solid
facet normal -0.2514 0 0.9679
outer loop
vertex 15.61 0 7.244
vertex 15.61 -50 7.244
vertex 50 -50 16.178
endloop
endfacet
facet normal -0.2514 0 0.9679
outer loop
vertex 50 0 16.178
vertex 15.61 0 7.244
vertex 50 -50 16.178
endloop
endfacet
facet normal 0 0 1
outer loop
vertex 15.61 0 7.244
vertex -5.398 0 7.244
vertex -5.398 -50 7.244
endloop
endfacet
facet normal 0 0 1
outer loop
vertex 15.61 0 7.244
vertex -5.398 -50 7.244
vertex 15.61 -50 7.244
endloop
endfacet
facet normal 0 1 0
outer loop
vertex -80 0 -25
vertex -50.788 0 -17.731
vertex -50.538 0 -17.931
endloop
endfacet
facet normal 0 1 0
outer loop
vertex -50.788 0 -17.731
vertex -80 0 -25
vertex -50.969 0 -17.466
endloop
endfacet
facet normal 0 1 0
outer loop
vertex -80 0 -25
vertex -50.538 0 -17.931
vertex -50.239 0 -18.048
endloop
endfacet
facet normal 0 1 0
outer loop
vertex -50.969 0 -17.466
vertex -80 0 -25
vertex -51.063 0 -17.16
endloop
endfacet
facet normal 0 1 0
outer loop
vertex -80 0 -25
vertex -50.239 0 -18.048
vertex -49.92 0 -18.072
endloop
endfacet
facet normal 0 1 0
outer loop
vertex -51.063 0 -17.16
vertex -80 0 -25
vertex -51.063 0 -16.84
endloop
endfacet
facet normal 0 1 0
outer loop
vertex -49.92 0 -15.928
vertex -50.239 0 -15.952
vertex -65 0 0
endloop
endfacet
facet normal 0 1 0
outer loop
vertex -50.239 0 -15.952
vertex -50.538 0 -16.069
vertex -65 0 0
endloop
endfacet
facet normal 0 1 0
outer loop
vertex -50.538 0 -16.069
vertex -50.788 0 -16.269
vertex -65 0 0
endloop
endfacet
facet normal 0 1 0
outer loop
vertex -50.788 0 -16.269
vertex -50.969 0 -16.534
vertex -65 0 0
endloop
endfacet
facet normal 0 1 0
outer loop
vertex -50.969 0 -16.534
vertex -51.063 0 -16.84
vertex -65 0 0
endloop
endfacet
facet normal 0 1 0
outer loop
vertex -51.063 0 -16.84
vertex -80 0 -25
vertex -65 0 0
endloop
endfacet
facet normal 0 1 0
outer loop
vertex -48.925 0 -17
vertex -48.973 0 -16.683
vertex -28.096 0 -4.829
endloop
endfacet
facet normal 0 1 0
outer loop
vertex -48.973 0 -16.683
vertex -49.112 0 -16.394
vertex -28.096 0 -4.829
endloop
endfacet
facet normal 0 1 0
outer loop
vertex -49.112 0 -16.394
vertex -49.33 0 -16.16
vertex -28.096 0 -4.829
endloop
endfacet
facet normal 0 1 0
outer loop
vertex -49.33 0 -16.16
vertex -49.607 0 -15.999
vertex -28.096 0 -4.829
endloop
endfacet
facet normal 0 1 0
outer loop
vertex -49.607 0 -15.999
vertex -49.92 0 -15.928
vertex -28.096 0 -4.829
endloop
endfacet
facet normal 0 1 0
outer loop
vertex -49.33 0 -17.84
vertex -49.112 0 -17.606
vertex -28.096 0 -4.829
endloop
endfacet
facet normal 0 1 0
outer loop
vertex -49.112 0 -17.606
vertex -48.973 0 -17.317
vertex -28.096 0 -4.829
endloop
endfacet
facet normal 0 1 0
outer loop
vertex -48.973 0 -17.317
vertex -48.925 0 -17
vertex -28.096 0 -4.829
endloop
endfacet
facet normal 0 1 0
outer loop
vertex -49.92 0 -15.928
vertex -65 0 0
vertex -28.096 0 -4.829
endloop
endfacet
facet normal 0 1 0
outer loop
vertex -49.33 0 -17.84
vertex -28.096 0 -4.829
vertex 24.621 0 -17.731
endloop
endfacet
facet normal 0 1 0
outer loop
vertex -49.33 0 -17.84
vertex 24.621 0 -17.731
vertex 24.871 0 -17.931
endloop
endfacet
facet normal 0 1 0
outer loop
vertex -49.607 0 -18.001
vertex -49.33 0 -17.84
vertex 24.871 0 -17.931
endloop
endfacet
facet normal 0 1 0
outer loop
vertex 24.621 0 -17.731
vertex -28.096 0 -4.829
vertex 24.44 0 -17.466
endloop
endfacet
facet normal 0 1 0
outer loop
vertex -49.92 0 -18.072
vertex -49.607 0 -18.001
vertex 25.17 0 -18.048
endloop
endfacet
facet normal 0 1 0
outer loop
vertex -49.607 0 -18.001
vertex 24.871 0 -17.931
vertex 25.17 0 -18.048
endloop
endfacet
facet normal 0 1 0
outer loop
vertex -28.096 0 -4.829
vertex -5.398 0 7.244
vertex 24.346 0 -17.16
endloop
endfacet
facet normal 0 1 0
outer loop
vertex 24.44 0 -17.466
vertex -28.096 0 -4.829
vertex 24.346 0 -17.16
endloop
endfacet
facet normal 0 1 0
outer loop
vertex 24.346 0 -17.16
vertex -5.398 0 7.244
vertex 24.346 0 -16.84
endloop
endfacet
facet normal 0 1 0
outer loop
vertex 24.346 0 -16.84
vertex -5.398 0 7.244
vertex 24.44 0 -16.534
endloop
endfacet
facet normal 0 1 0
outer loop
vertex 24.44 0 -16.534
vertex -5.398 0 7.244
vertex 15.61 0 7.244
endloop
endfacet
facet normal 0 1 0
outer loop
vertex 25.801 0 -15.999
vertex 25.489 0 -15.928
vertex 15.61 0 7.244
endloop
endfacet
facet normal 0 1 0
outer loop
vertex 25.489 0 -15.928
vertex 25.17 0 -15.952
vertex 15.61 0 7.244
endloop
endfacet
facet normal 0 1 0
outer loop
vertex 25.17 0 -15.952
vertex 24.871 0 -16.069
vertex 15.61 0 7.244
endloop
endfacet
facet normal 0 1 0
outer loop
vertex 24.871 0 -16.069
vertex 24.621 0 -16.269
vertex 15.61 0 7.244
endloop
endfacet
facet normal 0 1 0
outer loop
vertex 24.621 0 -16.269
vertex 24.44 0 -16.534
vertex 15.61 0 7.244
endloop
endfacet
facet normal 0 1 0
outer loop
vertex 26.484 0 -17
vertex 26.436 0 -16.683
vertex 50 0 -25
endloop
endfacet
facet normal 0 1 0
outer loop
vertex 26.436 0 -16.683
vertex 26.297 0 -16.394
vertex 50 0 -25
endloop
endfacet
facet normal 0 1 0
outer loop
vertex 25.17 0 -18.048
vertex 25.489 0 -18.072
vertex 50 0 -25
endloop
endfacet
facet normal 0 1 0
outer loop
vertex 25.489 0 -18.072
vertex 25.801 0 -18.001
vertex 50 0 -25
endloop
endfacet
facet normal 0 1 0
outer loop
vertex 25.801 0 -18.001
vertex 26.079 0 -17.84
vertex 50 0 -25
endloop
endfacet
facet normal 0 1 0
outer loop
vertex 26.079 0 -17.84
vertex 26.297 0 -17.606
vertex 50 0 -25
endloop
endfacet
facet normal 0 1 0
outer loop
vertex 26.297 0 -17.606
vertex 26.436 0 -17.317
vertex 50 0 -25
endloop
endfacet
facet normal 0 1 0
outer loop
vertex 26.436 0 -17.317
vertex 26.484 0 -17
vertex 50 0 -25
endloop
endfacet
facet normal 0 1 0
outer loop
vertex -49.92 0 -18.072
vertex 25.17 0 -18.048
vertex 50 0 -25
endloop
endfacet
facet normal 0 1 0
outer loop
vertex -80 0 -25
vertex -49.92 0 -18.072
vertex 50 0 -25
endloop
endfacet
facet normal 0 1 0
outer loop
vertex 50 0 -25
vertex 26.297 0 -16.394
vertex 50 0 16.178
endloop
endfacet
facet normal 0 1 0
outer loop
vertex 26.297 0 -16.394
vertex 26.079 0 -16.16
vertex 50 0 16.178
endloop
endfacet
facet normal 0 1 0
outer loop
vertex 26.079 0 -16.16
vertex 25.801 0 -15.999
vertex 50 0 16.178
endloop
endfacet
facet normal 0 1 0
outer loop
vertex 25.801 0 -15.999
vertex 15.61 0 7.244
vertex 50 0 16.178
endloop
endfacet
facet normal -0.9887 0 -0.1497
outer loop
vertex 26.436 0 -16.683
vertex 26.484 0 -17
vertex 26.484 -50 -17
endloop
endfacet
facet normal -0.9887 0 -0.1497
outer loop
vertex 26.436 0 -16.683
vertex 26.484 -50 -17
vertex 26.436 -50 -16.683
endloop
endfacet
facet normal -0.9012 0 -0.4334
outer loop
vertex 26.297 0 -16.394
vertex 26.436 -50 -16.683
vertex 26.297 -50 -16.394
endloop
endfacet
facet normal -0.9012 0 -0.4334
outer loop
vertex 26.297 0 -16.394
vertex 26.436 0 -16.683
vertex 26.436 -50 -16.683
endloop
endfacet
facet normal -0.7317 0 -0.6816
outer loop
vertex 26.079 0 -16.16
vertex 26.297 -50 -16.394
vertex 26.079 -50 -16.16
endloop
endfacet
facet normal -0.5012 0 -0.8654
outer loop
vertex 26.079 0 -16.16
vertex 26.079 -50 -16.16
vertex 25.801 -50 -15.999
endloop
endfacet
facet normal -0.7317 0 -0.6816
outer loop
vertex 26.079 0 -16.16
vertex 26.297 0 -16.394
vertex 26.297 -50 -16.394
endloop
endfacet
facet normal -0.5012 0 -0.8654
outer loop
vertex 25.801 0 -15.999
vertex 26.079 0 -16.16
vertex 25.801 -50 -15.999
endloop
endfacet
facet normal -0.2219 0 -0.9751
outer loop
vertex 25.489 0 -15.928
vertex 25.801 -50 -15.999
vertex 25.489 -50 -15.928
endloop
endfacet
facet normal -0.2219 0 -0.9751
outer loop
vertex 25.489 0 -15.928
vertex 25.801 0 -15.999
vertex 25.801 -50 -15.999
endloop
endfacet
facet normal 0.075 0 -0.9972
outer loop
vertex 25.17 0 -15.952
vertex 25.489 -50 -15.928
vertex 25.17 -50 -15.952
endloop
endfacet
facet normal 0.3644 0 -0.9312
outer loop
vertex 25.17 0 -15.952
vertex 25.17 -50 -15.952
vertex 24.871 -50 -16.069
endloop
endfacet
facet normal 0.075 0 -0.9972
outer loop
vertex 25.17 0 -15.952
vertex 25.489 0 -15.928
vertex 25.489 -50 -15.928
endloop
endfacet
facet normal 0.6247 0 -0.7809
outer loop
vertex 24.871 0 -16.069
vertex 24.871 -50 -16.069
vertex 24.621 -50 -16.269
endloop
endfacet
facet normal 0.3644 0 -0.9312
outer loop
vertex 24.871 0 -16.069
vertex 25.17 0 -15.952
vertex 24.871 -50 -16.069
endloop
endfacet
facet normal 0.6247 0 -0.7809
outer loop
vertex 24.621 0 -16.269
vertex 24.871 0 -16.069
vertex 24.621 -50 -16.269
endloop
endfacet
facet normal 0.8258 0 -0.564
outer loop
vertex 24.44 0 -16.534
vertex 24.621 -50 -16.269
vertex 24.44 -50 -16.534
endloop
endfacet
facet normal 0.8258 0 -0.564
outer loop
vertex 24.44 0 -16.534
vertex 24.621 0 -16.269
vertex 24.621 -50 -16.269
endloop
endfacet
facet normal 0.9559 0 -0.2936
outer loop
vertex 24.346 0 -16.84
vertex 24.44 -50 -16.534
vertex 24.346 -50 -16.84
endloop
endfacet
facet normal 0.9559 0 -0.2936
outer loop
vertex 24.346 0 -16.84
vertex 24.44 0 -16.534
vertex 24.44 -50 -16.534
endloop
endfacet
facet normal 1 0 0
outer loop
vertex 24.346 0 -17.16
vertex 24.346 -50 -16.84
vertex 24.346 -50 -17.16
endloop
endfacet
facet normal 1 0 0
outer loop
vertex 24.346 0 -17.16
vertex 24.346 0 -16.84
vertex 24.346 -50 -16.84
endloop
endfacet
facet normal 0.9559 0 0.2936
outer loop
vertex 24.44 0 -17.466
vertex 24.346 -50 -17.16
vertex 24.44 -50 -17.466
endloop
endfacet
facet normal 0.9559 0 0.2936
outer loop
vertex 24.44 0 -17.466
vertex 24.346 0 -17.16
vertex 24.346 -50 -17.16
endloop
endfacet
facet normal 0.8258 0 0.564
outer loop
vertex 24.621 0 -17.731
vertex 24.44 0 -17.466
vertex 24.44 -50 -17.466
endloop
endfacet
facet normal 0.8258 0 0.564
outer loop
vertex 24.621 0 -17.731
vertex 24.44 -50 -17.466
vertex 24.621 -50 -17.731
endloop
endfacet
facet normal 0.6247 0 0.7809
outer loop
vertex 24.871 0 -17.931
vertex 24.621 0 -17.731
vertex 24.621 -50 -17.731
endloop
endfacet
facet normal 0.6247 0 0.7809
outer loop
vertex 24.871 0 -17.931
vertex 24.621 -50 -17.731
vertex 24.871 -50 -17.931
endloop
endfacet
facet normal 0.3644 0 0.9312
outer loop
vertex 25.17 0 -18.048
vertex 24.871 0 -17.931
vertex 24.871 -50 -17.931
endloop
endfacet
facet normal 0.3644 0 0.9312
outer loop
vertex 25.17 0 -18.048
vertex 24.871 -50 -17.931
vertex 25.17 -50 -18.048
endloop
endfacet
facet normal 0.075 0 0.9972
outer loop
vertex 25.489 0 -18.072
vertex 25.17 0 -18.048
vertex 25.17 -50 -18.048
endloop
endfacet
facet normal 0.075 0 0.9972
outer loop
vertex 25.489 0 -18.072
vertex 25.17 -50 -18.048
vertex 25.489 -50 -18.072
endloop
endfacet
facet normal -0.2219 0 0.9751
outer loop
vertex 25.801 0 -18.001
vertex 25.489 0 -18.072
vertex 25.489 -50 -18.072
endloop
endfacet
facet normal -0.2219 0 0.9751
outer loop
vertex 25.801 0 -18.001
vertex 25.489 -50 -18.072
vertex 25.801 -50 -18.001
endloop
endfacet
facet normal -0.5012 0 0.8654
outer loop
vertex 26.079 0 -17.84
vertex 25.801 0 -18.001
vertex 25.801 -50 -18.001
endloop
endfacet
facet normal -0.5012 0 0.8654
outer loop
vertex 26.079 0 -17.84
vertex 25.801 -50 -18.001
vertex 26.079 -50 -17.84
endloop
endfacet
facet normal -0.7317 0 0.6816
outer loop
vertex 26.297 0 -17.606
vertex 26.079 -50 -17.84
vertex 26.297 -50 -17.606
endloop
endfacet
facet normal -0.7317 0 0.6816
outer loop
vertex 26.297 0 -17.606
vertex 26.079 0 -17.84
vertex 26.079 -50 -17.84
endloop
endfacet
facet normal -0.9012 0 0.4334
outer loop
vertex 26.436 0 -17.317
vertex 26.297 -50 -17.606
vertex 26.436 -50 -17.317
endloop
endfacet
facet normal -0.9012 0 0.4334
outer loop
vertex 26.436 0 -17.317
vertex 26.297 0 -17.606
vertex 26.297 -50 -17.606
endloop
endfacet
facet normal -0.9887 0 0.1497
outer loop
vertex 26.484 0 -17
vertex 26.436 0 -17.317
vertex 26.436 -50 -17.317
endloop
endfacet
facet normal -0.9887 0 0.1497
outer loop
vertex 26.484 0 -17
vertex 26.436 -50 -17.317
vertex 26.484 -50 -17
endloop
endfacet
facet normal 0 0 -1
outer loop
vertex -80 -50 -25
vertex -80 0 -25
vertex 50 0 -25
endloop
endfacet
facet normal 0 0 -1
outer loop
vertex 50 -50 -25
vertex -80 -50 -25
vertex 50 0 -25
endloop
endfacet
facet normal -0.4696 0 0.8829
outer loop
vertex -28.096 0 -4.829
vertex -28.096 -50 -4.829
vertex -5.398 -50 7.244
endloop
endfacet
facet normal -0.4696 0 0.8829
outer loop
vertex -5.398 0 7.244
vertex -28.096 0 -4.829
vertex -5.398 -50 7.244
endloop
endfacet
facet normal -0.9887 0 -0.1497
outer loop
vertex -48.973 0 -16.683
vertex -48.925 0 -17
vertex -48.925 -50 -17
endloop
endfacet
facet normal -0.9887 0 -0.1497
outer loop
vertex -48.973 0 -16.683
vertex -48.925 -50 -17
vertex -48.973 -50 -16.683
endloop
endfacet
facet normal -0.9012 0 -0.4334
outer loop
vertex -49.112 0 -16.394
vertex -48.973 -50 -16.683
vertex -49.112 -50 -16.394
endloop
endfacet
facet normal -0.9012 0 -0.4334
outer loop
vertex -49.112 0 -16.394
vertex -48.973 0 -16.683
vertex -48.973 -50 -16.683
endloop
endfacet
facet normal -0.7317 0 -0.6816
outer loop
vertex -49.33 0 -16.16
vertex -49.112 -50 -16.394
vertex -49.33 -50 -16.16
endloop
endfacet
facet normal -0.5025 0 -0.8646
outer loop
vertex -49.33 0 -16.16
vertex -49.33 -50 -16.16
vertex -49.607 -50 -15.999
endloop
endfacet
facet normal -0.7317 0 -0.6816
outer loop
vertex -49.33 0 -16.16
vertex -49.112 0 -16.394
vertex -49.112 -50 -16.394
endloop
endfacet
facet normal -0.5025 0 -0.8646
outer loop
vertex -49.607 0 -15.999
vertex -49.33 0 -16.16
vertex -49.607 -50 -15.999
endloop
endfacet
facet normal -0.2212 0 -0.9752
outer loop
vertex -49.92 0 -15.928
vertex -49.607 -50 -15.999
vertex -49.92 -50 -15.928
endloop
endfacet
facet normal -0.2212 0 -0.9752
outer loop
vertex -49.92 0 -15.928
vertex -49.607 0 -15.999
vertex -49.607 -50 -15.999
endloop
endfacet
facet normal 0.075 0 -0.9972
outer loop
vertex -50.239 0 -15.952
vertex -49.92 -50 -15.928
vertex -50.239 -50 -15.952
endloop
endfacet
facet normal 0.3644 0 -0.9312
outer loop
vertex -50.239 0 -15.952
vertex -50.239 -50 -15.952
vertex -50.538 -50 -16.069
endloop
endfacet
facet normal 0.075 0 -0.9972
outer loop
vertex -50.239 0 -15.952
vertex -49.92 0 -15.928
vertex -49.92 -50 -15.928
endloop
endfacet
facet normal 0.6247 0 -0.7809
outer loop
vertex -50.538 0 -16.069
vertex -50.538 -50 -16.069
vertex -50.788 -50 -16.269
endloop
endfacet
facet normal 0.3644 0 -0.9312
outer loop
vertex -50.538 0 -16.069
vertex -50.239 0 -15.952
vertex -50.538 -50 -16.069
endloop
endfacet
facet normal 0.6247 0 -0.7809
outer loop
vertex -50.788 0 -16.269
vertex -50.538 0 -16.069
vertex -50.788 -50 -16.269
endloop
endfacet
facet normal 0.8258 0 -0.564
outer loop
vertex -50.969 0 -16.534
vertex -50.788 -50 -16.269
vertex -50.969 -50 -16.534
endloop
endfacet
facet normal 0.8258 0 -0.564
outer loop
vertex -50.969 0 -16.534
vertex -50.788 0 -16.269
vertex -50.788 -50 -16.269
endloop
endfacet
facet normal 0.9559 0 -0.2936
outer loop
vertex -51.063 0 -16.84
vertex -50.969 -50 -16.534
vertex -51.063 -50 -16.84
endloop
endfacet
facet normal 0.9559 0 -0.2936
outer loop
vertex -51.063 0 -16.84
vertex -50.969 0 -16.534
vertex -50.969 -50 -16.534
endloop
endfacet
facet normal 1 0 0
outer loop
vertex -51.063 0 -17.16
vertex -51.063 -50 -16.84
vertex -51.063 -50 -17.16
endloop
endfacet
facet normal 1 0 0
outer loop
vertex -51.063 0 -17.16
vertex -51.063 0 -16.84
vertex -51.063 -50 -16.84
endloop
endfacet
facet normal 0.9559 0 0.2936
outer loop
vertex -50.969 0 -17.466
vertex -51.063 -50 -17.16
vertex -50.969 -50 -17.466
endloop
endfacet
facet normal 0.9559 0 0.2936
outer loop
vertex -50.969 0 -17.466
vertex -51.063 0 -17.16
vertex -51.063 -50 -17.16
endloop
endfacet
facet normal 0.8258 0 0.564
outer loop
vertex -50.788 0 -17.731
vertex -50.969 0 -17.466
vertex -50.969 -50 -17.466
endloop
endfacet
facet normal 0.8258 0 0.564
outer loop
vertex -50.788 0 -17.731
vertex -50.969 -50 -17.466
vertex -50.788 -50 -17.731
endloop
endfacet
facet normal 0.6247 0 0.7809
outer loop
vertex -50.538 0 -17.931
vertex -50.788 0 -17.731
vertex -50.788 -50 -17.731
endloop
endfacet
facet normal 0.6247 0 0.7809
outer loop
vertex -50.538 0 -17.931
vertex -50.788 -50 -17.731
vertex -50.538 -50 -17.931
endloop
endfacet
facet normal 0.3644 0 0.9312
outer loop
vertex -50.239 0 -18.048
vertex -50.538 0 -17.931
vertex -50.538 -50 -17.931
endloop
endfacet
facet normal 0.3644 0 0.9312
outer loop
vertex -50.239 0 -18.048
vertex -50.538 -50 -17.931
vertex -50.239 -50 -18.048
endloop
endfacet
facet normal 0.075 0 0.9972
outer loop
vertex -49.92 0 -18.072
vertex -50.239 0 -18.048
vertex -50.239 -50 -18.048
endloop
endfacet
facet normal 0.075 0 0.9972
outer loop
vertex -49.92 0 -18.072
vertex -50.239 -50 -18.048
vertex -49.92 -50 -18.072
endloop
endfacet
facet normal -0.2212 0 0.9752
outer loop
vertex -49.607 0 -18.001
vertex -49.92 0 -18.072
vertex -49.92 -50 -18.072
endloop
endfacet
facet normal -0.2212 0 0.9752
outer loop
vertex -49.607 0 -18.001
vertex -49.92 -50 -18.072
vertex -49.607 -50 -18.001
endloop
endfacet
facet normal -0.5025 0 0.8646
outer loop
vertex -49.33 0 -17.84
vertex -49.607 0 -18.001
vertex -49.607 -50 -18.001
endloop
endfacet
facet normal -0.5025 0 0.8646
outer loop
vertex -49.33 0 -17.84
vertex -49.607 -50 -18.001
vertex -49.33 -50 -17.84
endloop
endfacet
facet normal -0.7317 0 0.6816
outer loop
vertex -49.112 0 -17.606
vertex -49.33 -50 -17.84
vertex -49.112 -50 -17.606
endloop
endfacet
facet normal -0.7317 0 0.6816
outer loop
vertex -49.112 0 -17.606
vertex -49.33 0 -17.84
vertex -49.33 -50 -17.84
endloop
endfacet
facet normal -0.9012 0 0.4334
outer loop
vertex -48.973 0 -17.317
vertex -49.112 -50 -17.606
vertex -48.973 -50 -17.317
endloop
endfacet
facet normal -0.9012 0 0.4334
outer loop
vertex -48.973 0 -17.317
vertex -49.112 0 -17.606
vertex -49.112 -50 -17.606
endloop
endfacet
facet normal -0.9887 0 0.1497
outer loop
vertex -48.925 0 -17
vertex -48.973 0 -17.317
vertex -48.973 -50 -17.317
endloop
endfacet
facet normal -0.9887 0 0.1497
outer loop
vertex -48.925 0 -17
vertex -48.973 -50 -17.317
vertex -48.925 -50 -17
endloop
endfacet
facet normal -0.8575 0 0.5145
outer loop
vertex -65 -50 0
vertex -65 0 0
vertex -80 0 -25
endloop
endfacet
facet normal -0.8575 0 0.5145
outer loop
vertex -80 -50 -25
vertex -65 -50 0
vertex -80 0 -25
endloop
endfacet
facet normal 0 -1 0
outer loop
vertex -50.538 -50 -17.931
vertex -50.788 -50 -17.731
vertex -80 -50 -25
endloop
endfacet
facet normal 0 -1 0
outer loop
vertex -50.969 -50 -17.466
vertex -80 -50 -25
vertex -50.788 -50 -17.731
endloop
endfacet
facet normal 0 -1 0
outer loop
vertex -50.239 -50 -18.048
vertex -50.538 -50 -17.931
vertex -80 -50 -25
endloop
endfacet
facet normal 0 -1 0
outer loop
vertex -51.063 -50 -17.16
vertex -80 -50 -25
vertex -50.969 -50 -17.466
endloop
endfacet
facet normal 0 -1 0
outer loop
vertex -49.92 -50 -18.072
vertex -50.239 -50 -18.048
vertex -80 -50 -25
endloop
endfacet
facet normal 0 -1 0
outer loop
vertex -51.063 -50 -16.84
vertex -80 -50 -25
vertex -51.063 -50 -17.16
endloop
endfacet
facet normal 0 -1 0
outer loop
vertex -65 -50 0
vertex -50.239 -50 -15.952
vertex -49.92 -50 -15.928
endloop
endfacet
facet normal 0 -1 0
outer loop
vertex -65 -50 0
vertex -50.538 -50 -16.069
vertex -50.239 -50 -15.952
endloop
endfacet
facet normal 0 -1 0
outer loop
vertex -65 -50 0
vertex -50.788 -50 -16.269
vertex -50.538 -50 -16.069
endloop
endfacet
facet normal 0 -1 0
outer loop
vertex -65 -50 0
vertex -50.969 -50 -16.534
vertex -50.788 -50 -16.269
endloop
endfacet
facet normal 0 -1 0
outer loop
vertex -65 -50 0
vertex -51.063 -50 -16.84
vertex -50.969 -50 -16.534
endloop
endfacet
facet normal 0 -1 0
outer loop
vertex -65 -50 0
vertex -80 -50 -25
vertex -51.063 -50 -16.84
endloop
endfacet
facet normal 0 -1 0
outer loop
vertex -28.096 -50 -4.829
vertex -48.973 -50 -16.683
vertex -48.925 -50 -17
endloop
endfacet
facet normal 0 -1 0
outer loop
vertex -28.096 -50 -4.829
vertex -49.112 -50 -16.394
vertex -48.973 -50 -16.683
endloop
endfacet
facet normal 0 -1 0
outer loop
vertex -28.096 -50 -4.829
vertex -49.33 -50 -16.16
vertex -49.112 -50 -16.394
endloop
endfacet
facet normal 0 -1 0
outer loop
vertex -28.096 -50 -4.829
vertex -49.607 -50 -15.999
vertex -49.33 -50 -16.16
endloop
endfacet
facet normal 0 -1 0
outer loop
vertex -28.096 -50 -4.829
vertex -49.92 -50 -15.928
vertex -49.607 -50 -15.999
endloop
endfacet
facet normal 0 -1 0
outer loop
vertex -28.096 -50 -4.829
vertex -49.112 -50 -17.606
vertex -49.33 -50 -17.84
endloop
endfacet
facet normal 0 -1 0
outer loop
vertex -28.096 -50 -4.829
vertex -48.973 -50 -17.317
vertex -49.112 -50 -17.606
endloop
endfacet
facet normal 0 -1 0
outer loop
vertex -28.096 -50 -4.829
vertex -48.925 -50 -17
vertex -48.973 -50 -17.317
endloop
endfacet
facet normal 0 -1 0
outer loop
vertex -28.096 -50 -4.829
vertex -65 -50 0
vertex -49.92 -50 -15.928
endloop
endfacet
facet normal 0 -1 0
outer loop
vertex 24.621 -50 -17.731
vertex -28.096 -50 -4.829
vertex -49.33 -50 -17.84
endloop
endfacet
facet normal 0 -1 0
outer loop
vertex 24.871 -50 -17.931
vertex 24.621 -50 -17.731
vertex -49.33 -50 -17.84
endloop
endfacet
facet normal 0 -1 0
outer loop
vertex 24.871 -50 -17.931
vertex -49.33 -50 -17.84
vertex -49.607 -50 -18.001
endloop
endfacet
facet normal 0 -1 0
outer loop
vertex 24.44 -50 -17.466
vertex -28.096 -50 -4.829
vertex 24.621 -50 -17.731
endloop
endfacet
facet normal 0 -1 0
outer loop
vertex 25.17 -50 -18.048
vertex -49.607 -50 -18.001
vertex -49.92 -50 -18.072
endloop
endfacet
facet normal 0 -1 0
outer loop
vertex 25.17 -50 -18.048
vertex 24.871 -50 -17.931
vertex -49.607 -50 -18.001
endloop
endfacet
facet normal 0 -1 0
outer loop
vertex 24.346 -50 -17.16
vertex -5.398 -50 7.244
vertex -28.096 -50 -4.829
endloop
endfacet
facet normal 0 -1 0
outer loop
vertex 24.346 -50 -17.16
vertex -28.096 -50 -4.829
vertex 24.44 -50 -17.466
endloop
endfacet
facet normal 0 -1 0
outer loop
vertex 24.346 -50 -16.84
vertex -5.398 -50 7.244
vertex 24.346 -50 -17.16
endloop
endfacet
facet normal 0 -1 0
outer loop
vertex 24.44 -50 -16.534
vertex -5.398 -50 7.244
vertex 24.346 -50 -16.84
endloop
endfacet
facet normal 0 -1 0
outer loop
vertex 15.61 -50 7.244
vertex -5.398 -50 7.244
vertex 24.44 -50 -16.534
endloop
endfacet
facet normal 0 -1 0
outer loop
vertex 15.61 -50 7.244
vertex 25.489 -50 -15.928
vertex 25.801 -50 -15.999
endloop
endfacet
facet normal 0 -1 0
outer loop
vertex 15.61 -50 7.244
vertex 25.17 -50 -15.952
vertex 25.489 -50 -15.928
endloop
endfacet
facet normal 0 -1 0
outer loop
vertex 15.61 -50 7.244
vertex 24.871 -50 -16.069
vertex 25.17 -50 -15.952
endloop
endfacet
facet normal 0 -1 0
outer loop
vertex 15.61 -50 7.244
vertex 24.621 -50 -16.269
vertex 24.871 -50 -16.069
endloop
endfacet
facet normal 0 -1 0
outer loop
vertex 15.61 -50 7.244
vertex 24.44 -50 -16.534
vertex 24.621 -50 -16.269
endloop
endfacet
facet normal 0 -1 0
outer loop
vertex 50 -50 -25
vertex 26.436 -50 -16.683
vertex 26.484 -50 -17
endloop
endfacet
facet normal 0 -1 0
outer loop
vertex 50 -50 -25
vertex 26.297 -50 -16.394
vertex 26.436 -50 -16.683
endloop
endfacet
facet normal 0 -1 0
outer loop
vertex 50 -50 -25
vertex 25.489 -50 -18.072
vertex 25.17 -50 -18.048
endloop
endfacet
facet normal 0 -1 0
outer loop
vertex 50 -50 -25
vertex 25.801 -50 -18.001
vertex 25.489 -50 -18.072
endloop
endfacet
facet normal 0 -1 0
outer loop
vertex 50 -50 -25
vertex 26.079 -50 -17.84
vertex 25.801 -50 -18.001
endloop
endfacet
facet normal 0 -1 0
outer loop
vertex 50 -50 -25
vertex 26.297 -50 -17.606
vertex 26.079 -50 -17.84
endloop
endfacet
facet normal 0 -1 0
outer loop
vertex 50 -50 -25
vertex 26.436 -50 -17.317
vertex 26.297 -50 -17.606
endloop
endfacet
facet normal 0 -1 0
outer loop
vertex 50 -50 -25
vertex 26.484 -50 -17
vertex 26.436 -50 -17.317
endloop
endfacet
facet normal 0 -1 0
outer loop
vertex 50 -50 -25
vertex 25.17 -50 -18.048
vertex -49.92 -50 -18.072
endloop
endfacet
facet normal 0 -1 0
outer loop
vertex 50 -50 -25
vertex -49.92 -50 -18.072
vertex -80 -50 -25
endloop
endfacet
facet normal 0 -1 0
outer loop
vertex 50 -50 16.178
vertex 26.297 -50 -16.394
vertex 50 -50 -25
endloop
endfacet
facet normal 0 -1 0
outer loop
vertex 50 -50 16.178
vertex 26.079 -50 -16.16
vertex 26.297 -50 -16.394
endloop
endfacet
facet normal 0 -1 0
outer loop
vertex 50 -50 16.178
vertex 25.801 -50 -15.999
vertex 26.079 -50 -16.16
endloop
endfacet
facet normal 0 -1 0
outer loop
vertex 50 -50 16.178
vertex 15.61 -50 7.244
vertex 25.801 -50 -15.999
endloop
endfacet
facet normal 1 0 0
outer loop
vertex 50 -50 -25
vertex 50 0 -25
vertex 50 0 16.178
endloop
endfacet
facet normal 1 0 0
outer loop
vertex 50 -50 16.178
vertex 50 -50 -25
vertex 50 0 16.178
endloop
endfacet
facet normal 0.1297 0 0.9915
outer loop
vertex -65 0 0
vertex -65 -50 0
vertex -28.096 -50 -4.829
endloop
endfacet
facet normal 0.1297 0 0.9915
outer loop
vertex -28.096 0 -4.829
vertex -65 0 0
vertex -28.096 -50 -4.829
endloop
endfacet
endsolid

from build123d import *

# Parameters (mm, degrees)
F0_R     = 1.075
F1_DEPTH = 50
F3_DEPTH = 50


with BuildPart() as f1:
    # F0 (on Front) → F1 (new body)
    with BuildSketch(Plane.XZ):
        Polygon((25, -25), (50, -25), (50, 25), (-50, 25), (-80, -25), (-50, -25), align=None)
        with Locations((-50, -17)):
            Circle(F0_R, mode=Mode.SUBTRACT)
        with Locations((25.408758, -17)):
            Circle(F0_R, mode=Mode.SUBTRACT)
    extrude(amount=F1_DEPTH)

    # F2 (on face) → F3 (cut)
    with BuildSketch(Plane.XZ.offset(50)):
        Polygon((-50, 25), (-65, 0), (-28.095694, -4.829377), (-5.397624, 7.244065), (15.610165, 7.244065), (50, 16.178414), (50, 25), align=None)
    extrude(amount=-F3_DEPTH, mode=Mode.SUBTRACT)


solid = f1.part
